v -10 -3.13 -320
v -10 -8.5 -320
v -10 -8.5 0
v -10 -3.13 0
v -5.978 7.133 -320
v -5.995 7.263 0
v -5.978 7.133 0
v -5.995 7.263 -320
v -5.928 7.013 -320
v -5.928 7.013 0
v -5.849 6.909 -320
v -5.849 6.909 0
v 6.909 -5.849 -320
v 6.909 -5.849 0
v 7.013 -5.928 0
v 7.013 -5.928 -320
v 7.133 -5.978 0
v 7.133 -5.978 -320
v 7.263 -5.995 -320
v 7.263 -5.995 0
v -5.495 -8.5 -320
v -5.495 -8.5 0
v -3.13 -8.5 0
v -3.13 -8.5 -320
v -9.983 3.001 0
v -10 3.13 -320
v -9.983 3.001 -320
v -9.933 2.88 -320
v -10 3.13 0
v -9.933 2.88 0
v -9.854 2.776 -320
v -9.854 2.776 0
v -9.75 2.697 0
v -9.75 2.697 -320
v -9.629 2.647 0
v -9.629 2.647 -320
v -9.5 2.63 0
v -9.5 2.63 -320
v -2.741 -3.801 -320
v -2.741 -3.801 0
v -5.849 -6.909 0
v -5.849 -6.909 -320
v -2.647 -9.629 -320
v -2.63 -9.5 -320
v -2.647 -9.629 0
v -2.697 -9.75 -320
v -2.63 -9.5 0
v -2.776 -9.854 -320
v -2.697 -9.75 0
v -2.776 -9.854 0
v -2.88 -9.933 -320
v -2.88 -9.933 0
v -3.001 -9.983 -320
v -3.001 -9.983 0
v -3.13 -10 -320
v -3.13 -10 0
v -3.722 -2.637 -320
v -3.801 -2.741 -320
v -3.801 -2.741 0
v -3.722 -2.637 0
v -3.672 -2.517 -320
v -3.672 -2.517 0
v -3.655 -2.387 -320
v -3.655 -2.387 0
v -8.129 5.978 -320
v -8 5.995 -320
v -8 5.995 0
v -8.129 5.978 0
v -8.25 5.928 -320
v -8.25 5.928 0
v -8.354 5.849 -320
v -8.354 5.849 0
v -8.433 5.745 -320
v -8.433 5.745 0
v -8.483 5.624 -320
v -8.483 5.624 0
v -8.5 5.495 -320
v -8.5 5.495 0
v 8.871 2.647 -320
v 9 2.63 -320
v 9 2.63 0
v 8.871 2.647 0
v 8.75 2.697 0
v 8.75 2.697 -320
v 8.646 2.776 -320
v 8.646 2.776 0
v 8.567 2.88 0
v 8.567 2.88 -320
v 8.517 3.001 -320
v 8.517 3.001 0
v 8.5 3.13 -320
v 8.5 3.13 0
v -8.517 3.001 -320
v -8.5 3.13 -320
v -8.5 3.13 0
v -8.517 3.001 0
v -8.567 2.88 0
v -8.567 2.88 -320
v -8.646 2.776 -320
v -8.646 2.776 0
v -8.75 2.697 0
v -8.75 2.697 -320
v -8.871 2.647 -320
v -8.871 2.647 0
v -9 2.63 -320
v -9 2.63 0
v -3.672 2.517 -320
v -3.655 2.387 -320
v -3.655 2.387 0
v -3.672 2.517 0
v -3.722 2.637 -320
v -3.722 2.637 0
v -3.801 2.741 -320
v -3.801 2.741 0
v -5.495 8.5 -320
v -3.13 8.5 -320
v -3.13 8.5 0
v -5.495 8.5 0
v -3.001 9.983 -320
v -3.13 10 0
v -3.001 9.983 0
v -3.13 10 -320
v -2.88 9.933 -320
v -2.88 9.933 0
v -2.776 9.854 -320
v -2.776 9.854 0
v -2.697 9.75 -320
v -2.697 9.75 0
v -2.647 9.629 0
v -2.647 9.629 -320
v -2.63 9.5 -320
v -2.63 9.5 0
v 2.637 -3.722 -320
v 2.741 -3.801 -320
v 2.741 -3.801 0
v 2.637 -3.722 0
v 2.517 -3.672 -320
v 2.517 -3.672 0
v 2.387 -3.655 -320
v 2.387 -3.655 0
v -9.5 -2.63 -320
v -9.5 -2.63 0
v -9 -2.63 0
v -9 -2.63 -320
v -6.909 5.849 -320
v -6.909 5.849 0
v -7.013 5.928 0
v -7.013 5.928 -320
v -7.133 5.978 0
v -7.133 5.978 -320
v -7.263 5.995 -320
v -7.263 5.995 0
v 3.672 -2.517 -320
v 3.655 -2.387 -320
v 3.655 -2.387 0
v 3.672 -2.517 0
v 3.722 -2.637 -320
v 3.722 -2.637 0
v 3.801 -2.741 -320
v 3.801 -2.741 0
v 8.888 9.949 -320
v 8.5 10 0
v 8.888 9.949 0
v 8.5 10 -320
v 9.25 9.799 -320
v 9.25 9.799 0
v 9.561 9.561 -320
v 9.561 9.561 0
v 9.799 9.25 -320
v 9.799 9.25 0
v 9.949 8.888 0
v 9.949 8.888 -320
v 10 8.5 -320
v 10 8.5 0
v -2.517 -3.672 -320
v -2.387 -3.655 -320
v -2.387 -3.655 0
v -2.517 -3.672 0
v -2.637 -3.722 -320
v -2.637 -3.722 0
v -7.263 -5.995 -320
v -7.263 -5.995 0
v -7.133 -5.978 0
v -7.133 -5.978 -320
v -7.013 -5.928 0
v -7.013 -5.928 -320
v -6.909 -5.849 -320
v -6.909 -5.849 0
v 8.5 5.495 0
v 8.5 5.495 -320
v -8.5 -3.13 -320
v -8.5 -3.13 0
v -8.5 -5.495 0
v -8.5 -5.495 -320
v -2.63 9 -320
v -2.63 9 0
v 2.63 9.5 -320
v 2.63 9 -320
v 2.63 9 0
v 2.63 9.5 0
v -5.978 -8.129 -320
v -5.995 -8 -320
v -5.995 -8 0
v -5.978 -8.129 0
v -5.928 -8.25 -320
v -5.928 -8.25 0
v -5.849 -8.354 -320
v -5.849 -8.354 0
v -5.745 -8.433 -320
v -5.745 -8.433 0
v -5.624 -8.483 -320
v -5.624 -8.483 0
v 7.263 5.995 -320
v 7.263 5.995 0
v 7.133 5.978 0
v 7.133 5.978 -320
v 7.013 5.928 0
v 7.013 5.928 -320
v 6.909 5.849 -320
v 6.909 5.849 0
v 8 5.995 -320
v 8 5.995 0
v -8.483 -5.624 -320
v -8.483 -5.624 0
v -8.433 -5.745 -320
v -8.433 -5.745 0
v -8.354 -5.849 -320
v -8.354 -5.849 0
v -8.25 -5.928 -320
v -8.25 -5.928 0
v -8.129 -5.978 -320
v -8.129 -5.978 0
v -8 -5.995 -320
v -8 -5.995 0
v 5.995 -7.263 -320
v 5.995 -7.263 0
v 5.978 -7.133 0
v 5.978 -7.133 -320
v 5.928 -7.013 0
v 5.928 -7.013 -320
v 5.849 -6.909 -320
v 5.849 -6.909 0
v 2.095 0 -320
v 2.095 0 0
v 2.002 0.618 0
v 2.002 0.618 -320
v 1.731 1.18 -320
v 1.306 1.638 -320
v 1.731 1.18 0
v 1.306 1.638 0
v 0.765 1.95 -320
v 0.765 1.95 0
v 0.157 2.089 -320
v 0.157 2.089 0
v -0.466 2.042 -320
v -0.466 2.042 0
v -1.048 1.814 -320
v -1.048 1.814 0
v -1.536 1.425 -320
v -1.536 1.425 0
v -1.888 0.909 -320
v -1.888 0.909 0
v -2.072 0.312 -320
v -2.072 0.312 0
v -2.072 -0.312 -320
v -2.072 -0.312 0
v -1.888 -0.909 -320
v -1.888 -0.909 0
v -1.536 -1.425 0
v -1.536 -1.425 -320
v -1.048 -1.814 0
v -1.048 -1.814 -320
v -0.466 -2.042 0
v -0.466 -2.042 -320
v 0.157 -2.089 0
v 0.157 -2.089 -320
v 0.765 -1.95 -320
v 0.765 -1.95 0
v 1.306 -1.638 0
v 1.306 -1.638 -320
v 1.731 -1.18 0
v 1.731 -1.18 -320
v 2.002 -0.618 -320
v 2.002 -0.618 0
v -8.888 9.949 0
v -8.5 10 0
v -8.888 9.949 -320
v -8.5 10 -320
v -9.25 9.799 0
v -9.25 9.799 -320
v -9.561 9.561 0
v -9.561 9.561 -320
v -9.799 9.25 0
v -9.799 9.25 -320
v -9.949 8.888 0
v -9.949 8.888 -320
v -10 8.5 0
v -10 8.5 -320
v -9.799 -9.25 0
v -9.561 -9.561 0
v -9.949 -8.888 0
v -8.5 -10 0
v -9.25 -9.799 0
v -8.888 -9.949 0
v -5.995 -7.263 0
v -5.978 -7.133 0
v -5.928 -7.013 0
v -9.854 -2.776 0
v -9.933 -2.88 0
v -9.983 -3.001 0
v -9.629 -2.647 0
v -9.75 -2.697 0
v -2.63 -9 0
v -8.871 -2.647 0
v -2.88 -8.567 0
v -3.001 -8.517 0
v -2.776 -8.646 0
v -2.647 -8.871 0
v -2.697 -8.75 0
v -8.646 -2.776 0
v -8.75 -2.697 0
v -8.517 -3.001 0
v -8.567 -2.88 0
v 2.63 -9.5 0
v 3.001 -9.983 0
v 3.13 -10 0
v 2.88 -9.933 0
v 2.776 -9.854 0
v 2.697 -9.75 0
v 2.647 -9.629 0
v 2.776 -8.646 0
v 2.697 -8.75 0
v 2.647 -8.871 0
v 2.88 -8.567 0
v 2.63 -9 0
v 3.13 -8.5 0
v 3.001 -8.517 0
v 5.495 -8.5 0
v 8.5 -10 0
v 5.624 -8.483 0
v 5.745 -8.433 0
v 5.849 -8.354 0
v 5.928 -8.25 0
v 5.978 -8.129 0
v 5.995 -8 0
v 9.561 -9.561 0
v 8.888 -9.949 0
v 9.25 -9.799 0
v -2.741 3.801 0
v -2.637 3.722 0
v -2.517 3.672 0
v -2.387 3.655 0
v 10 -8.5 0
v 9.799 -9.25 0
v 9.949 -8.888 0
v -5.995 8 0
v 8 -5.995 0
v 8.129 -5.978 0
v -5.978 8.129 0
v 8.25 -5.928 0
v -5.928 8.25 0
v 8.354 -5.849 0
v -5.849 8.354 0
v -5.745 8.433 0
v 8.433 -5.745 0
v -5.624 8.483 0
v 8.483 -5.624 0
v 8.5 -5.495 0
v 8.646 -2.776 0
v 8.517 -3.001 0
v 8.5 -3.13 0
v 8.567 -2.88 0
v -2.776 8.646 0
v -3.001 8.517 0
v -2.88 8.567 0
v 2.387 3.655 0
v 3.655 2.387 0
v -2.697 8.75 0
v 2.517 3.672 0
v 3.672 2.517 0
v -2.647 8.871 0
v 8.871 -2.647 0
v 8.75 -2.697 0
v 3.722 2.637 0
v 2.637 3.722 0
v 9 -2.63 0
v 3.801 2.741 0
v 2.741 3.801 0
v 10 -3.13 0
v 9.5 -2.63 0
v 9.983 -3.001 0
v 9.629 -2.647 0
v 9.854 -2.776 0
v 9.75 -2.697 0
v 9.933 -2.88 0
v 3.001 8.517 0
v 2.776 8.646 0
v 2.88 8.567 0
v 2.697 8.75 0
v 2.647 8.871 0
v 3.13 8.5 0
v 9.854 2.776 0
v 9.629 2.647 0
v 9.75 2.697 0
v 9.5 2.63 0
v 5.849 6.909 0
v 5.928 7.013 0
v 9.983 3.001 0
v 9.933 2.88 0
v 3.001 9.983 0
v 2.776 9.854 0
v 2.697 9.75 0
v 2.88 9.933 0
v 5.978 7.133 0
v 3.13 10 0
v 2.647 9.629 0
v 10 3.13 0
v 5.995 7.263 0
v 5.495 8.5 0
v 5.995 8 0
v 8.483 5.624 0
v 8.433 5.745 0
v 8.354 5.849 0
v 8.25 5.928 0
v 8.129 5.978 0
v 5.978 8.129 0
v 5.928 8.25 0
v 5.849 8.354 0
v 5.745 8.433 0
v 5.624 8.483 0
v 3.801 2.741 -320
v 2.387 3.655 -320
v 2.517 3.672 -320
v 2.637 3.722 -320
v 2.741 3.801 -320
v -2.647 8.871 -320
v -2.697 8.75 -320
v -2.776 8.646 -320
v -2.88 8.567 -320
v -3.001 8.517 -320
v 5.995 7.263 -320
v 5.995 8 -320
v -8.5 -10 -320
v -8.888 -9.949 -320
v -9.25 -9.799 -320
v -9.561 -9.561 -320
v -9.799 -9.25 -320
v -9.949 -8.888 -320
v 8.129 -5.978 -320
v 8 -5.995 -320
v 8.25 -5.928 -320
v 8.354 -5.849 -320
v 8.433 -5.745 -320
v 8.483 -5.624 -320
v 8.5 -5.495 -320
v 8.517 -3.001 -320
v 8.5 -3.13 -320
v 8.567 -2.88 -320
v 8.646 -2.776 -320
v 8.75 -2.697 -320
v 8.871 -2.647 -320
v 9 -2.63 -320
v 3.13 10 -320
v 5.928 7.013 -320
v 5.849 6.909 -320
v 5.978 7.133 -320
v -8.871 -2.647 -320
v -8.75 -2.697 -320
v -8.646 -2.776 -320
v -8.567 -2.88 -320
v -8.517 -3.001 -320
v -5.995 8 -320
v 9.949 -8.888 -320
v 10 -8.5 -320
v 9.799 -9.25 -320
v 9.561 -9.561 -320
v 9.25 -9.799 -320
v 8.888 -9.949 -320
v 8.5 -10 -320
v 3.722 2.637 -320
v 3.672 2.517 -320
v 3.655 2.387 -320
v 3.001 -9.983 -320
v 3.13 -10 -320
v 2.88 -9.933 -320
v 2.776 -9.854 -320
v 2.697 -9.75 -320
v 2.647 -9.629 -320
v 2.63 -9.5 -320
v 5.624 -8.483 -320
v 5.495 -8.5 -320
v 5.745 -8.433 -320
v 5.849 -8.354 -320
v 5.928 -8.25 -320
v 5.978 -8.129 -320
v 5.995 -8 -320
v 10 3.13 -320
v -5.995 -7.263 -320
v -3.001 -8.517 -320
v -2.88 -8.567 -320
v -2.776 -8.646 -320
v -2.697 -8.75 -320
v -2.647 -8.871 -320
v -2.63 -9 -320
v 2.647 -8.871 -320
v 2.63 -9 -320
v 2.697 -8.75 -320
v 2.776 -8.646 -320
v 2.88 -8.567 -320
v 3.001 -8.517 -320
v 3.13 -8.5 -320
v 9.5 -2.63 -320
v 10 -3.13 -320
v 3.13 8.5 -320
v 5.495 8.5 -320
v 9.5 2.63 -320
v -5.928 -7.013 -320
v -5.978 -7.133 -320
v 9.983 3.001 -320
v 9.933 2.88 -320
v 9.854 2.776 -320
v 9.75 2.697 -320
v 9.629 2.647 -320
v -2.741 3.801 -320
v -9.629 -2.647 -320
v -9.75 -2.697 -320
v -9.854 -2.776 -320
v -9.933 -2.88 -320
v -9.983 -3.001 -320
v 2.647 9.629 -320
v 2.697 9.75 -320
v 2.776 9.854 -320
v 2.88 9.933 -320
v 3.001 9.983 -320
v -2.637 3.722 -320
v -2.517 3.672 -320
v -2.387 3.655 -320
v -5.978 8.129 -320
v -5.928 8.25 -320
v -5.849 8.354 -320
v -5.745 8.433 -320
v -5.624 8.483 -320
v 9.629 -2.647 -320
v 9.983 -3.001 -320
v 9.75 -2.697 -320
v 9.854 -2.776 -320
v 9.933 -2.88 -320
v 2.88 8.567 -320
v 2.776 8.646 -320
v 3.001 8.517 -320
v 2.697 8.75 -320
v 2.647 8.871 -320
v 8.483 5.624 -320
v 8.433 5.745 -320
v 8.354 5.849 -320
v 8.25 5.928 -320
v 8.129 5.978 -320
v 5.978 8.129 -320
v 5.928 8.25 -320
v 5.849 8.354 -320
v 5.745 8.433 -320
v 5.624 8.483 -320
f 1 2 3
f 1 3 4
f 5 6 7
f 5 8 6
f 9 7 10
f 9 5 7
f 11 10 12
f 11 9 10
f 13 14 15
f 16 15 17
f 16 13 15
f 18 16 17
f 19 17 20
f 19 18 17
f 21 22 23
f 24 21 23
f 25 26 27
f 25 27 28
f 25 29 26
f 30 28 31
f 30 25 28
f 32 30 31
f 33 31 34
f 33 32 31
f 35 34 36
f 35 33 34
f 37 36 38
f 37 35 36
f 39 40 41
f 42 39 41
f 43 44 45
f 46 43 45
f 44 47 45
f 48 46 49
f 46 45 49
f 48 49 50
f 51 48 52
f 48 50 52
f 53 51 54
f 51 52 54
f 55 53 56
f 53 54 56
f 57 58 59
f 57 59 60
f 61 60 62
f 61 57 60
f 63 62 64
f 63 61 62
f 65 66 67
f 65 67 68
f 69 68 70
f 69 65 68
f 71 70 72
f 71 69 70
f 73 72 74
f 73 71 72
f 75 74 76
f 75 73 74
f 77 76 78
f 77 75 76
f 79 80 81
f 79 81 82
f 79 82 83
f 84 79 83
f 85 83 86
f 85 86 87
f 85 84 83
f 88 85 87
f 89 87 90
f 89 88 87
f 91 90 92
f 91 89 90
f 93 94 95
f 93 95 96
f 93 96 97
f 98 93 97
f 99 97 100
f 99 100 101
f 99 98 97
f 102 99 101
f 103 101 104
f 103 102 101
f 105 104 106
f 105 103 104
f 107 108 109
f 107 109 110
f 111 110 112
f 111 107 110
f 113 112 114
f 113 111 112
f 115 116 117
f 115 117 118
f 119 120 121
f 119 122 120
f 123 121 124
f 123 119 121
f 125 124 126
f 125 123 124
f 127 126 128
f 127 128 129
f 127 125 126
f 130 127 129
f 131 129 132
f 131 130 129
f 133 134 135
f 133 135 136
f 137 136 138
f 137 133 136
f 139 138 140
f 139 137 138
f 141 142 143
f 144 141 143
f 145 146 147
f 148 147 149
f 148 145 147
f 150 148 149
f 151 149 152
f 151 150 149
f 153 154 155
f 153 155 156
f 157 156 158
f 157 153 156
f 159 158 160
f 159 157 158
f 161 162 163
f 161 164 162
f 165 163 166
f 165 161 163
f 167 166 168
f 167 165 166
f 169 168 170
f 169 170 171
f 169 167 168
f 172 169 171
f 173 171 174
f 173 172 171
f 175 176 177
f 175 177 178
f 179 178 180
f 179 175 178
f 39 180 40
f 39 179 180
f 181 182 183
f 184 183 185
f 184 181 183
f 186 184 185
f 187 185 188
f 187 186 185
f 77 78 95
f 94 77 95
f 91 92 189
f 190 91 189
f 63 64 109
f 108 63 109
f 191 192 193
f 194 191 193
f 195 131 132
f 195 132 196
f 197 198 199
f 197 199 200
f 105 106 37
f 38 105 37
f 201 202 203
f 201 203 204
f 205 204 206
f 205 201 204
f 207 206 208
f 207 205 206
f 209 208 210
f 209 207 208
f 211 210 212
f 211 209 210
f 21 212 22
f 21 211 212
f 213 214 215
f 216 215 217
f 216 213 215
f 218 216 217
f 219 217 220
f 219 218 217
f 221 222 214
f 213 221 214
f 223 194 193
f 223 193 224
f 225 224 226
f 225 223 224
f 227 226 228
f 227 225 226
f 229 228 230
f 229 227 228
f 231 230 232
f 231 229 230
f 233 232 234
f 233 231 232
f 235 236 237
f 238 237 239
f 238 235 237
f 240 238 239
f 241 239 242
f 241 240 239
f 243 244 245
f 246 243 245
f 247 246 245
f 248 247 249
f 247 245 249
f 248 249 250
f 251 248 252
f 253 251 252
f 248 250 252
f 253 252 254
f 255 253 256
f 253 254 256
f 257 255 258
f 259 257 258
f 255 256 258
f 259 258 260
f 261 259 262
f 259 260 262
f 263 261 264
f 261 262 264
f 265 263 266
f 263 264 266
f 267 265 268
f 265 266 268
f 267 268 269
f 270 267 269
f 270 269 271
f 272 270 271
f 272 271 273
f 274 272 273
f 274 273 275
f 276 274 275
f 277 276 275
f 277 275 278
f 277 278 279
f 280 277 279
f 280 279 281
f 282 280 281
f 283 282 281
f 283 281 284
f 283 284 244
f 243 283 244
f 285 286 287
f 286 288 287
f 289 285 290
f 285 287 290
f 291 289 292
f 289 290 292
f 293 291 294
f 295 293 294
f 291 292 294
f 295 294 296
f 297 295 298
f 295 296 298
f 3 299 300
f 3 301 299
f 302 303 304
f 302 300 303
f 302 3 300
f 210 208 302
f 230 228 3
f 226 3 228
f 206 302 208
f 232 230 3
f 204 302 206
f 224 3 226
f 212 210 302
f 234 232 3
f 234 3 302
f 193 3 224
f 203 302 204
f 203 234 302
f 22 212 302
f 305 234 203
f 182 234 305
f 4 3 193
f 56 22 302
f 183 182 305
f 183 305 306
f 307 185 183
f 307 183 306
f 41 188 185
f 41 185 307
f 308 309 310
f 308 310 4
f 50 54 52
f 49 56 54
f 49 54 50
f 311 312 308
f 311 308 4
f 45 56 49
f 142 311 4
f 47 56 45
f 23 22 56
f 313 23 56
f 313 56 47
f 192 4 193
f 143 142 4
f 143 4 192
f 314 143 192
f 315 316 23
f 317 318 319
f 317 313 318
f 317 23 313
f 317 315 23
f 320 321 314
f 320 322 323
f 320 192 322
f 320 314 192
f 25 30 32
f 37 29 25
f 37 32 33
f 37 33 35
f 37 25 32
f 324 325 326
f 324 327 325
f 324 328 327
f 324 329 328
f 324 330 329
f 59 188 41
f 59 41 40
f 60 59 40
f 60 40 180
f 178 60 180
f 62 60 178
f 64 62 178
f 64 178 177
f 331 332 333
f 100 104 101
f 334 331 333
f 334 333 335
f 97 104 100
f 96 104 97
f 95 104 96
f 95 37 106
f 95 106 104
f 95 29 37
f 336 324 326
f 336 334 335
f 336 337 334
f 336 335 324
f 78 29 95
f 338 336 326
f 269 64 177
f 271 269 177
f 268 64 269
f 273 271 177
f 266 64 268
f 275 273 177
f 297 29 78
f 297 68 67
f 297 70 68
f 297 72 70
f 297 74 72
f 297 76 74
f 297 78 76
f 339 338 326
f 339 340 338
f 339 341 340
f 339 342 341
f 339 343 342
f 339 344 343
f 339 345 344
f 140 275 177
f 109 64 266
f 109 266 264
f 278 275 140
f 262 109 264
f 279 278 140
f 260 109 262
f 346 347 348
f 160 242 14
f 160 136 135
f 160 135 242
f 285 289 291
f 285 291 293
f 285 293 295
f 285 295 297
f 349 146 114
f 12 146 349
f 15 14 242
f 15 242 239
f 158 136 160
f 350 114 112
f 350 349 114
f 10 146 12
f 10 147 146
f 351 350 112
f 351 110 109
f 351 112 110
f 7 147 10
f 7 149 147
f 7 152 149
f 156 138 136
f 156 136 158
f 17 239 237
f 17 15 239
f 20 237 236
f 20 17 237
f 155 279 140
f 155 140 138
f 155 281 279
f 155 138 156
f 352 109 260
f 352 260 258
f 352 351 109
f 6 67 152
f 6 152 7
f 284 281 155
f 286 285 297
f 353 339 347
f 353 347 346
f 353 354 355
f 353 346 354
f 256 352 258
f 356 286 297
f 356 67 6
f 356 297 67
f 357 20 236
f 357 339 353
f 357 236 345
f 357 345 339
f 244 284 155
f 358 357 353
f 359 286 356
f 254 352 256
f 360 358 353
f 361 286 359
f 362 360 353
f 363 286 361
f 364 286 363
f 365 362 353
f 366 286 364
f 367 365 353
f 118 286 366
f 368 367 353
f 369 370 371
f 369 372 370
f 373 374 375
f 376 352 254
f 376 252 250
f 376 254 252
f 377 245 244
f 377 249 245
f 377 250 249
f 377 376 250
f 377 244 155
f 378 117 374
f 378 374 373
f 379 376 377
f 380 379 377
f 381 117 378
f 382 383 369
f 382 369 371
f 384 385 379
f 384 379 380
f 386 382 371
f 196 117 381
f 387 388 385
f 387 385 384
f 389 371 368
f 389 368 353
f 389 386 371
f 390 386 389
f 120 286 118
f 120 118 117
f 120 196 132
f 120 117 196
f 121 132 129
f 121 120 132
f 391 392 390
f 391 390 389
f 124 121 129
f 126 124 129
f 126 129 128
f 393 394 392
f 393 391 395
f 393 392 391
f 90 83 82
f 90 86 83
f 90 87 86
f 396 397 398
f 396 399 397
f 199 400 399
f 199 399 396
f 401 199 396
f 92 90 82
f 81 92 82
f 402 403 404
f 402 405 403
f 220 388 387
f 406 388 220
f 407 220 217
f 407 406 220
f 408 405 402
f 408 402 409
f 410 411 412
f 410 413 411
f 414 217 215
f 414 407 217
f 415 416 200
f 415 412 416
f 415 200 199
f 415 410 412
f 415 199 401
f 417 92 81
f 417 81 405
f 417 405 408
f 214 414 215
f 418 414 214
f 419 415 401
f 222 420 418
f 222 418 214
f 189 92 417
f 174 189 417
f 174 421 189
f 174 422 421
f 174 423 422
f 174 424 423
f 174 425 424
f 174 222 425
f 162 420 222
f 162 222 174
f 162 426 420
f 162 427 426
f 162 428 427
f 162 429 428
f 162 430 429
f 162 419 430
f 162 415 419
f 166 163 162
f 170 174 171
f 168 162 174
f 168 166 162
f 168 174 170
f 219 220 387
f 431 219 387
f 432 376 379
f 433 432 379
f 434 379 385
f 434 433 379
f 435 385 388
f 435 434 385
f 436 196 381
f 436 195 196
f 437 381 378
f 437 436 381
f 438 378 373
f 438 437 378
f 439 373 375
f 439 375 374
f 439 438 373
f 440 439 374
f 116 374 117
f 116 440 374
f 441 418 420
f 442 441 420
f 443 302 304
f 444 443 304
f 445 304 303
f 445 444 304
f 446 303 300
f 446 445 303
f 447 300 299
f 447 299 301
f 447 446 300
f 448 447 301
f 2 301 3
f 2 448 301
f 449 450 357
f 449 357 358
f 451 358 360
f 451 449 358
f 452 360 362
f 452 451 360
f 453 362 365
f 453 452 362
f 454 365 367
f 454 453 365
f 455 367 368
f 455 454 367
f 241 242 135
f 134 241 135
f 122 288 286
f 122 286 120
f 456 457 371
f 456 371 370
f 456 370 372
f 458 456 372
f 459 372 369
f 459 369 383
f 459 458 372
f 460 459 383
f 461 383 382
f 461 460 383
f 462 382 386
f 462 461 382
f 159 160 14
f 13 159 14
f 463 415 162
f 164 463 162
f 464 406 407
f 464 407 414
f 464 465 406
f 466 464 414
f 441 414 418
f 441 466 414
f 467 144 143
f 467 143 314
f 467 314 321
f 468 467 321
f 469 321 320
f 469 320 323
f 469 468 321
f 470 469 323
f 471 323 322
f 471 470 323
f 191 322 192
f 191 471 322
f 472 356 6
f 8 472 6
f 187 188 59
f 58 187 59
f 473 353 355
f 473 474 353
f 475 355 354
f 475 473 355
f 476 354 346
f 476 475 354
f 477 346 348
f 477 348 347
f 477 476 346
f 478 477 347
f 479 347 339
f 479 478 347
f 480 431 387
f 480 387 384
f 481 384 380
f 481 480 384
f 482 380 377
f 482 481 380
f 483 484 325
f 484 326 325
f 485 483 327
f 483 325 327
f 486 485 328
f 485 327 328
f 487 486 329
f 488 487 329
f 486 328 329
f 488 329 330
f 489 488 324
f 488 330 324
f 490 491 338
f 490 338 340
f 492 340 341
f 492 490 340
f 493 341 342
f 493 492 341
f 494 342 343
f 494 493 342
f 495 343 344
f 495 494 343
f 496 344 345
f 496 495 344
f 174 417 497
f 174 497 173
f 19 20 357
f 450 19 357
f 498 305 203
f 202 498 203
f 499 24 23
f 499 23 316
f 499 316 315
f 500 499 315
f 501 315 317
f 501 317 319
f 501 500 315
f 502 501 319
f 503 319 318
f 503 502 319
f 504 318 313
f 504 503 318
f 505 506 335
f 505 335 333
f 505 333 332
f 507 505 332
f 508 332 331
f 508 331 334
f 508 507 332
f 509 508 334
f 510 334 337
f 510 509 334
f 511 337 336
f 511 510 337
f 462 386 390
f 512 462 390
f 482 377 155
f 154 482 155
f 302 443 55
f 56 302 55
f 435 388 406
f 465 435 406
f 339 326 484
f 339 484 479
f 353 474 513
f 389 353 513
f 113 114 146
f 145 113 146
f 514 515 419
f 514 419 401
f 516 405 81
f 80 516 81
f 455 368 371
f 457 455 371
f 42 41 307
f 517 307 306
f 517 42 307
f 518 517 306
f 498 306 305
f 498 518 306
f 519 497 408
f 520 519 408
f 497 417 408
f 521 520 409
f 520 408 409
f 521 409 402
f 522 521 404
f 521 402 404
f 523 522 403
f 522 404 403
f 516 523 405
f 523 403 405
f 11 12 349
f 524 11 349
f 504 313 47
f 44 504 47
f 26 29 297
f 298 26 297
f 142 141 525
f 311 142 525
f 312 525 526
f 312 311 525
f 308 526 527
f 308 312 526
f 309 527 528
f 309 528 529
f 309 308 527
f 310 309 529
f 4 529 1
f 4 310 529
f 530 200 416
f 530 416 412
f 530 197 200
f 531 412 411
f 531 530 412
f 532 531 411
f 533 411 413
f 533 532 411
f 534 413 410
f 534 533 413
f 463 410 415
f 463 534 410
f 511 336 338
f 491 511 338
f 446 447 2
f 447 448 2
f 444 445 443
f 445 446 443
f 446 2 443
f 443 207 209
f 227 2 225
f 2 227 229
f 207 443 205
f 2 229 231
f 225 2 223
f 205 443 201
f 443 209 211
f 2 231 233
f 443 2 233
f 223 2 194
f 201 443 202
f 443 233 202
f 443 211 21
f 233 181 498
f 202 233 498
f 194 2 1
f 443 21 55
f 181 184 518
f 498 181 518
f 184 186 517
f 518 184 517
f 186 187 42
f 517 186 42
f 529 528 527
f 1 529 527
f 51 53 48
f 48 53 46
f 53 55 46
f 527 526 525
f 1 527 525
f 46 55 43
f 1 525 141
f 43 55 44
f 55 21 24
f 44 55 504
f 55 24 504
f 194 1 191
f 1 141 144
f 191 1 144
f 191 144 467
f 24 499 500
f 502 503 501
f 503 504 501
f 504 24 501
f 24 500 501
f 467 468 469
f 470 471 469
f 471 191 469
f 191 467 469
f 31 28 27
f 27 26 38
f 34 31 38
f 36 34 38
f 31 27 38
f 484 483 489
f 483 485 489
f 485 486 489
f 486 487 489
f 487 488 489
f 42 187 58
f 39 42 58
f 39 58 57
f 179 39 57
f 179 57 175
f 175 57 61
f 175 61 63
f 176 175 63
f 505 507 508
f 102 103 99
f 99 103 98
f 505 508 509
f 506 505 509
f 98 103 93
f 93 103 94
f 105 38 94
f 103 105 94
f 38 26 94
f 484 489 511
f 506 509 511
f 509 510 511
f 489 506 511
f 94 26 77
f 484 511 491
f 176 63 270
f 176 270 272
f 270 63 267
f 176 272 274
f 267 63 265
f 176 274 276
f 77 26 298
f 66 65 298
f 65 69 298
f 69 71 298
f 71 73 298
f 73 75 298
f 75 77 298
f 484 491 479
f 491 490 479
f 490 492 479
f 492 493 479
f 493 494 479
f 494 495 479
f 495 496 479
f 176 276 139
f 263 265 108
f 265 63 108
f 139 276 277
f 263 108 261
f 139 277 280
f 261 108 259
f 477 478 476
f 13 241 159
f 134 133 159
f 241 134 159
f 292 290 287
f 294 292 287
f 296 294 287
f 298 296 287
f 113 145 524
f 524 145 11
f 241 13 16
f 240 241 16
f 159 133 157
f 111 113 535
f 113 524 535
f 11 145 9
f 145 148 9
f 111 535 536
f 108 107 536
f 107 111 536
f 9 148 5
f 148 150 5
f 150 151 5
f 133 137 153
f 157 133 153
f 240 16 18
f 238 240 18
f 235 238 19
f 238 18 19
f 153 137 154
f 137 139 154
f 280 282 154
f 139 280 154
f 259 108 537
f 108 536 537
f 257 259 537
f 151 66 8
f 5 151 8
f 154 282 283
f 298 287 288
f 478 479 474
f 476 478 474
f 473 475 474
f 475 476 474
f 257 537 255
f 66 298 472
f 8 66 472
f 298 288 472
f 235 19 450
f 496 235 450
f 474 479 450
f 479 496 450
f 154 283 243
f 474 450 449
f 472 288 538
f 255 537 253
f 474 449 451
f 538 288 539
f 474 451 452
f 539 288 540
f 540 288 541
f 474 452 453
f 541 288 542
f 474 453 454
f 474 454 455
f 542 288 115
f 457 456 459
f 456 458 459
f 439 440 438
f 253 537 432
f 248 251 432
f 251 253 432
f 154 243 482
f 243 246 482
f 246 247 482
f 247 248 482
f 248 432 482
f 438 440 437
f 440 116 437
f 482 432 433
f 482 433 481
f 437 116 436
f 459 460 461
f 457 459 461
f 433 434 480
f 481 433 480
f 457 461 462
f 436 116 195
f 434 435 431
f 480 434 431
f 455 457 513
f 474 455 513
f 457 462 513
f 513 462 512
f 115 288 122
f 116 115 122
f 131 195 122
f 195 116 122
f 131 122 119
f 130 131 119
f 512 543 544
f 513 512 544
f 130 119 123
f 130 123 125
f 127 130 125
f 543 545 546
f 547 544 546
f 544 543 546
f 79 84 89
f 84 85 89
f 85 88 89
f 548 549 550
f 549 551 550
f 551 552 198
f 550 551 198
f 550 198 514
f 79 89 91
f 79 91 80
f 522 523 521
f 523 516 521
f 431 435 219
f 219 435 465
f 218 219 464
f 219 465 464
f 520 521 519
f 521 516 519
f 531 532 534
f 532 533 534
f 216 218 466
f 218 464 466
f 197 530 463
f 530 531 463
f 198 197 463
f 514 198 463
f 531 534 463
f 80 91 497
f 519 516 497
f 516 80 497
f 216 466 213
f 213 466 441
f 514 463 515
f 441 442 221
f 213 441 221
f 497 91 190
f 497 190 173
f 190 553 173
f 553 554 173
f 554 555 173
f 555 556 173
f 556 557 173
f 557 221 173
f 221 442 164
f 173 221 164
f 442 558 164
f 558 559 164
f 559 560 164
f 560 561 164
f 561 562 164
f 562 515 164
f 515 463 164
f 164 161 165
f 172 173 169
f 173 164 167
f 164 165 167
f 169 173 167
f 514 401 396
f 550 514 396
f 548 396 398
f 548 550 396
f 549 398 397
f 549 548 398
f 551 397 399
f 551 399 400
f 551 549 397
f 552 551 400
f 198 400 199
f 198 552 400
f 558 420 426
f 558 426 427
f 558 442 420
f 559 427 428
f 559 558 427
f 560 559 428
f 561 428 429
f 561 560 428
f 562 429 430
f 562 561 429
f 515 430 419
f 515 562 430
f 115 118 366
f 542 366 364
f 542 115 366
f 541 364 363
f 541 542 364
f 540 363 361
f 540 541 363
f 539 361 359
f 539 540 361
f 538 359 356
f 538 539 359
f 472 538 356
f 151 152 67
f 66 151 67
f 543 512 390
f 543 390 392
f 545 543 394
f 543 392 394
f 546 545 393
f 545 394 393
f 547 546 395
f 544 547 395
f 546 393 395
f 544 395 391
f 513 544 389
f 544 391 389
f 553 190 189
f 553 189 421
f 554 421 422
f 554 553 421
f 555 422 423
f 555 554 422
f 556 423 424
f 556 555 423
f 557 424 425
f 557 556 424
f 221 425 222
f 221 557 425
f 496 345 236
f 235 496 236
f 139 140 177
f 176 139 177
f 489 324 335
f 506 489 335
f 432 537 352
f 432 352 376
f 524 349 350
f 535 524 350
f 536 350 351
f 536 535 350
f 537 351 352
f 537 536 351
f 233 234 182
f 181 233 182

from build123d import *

# Parameters (mm, degrees)
SKETCH1_W           = 20
SKETCH1_H           = 20
BOSS_EXTRUDE1_DEPTH = 320
CUT_EXTRUDE1_DEPTH  = 321.312347561
FILLET1_R           = 0.5
CIRPATTERN1_START   = -320
CIRPATTERN1_DEPTH   = 320
FILLET2_R           = 1.5
SKETCH3_R           = 2.095
CUT_EXTRUDE2_DEPTH  = 321.312347561
FILLET3_R           = 0.5


# Read off the part's stored shape, not the designer's step: CirPattern1
with BuildPart() as part:
    # Sketch1 → Boss-Extrude1 (new body)
    with BuildSketch(Plane.XY):
        Rectangle(SKETCH1_W, SKETCH1_H)
    extrude(amount=-BOSS_EXTRUDE1_DEPTH)

    # Sketch2 → Cut-Extrude1 (cut, through all)
    with BuildSketch(Plane.XY):
        Polygon((0, 10), (-2.63, 10), (-2.63, 8.5), (-5.995, 8.5), (-5.995, 7.055660172), (-2.594339828, 3.655), (2.594339828, 3.655), (5.995, 7.055660172), (5.995, 8.5), (2.63, 8.5), (2.63, 10), align=None)
    extrude(amount=-CUT_EXTRUDE1_DEPTH, mode=Mode.SUBTRACT)

    # Fillet1
    fillet1_edges = [part.edges().sort_by_distance(p)[0] for p in [
        (2.63, 10, -160),
        (2.63, 8.5, -160),
        (5.995, 8.5, -160),
        (5.995, 7.055660172, -160),
        (2.594339828, 3.655, -160),
        (-2.594339828, 3.655, -160),
        (-5.995, 7.055660172, -160),
        (-5.995, 8.5, -160),
        (-2.63, 8.5, -160),
        (-2.63, 10, -160),
    ]]
    fillet(fillet1_edges, radius=FILLET1_R)

    # CirPattern1 outline → CirPattern1 (cut)
    with BuildSketch(Plane.XY.offset(CIRPATTERN1_START)):
        with BuildLine():
            Line((-2.63, -10), (2.63, -10))
            Line((2.63, -10), (2.63, -9))
            ThreePointArc((2.63, -9), (2.776446609, -8.646446609), (3.13, -8.5))
            Line((3.13, -8.5), (5.495, -8.5))
            ThreePointArc((5.495, -8.5), (5.848553391, -8.353553391), (5.995, -8))
            Line((5.995, -8), (5.995, -7.262766953))
            ThreePointArc((5.995, -7.262766953), (5.956939766, -7.071425237), (5.848553391, -6.909213562))
            Line((5.848553391, -6.909213562), (2.740786438, -3.801446609))
            ThreePointArc((2.740786438, -3.801446609), (2.578574763, -3.693060234), (2.387233047, -3.655))
            Line((2.387233047, -3.655), (-2.387233047, -3.655))
            ThreePointArc((-2.387233047, -3.655), (-2.578574763, -3.693060234), (-2.740786438, -3.801446609))
            Line((-2.740786438, -3.801446609), (-5.848553391, -6.909213562))
            ThreePointArc((-5.848553391, -6.909213562), (-5.956939766, -7.071425237), (-5.995, -7.262766953))
            Line((-5.995, -7.262766953), (-5.995, -8))
            ThreePointArc((-5.995, -8), (-5.848553391, -8.353553391), (-5.495, -8.5))
            Line((-5.495, -8.5), (-3.13, -8.5))
            ThreePointArc((-3.13, -8.5), (-2.776446609, -8.646446609), (-2.63, -9))
            Line((-2.63, -9), (-2.63, -10))
        make_face()
        with BuildLine():
            Line((-10, 2.63), (-10, -2.63))
            Line((-10, -2.63), (-9, -2.63))
            ThreePointArc((-9, -2.63), (-8.646446609, -2.776446609), (-8.5, -3.13))
            Line((-8.5, -3.13), (-8.5, -5.495))
            ThreePointArc((-8.5, -5.495), (-8.353553391, -5.848553391), (-8, -5.995))
            Line((-8, -5.995), (-7.262766953, -5.995))
            ThreePointArc((-7.262766953, -5.995), (-7.071425237, -5.956939766), (-6.909213562, -5.848553391))
            Line((-6.909213562, -5.848553391), (-3.801446609, -2.740786438))
            ThreePointArc((-3.801446609, -2.740786438), (-3.693060234, -2.578574763), (-3.655, -2.387233047))
            Line((-3.655, -2.387233047), (-3.655, 2.387233047))
            ThreePointArc((-3.655, 2.387233047), (-3.693060234, 2.578574763), (-3.801446609, 2.740786438))
            Line((-3.801446609, 2.740786438), (-6.909213562, 5.848553391))
            ThreePointArc((-6.909213562, 5.848553391), (-7.071425237, 5.956939766), (-7.262766953, 5.995))
            Line((-7.262766953, 5.995), (-8, 5.995))
            ThreePointArc((-8, 5.995), (-8.353553391, 5.848553391), (-8.5, 5.495))
            Line((-8.5, 5.495), (-8.5, 3.13))
            ThreePointArc((-8.5, 3.13), (-8.646446609, 2.776446609), (-9, 2.63))
            Line((-9, 2.63), (-10, 2.63))
        make_face()
        with BuildLine():
            Line((9, -2.63), (10, -2.63))
            Line((10, -2.63), (10, 2.63))
            Line((10, 2.63), (9, 2.63))
            ThreePointArc((9, 2.63), (8.646446609, 2.776446609), (8.5, 3.13))
            Line((8.5, 3.13), (8.5, 5.495))
            ThreePointArc((8.5, 5.495), (8.353553391, 5.848553391), (8, 5.995))
            Line((8, 5.995), (7.262766953, 5.995))
            ThreePointArc((7.262766953, 5.995), (7.071425237, 5.956939766), (6.909213562, 5.848553391))
            Line((6.909213562, 5.848553391), (3.801446609, 2.740786438))
            ThreePointArc((3.801446609, 2.740786438), (3.693060234, 2.578574763), (3.655, 2.387233047))
            Line((3.655, 2.387233047), (3.655, -2.387233047))
            ThreePointArc((3.655, -2.387233047), (3.693060234, -2.578574763), (3.801446609, -2.740786438))
            Line((3.801446609, -2.740786438), (6.909213562, -5.848553391))
            ThreePointArc((6.909213562, -5.848553391), (7.071425237, -5.956939766), (7.262766953, -5.995))
            Line((7.262766953, -5.995), (8, -5.995))
            ThreePointArc((8, -5.995), (8.353553391, -5.848553391), (8.5, -5.495))
            Line((8.5, -5.495), (8.5, -3.13))
            ThreePointArc((8.5, -3.13), (8.646446609, -2.776446609), (9, -2.63))
        make_face()
    extrude(amount=CIRPATTERN1_DEPTH, mode=Mode.SUBTRACT)

    # Fillet2
    fillet2_edges = [part.edges().sort_by_distance(p)[0] for p in [
        (10, -10, -160),
        (-10, -10, -160),
        (-10, 10, -160),
        (10, 10, -160),
    ]]
    fillet(fillet2_edges, radius=FILLET2_R)

    # Sketch3 → Cut-Extrude2 (cut, through all)
    with BuildSketch(Plane.XY):
        Circle(SKETCH3_R)
    extrude(amount=-CUT_EXTRUDE2_DEPTH, mode=Mode.SUBTRACT)

    # Fillet3
    fillet3_edges = [part.edges().sort_by_distance(p)[0] for p in [
        (-10, 2.63, -160),
        (-10, -2.63, -160),
        (-2.63, -10, -160),
        (2.63, -10, -160),
        (10, -2.63, -160),
        (10, 2.63, -160),
    ]]
    fillet(fillet3_edges, radius=FILLET3_R)


solid = part.part
